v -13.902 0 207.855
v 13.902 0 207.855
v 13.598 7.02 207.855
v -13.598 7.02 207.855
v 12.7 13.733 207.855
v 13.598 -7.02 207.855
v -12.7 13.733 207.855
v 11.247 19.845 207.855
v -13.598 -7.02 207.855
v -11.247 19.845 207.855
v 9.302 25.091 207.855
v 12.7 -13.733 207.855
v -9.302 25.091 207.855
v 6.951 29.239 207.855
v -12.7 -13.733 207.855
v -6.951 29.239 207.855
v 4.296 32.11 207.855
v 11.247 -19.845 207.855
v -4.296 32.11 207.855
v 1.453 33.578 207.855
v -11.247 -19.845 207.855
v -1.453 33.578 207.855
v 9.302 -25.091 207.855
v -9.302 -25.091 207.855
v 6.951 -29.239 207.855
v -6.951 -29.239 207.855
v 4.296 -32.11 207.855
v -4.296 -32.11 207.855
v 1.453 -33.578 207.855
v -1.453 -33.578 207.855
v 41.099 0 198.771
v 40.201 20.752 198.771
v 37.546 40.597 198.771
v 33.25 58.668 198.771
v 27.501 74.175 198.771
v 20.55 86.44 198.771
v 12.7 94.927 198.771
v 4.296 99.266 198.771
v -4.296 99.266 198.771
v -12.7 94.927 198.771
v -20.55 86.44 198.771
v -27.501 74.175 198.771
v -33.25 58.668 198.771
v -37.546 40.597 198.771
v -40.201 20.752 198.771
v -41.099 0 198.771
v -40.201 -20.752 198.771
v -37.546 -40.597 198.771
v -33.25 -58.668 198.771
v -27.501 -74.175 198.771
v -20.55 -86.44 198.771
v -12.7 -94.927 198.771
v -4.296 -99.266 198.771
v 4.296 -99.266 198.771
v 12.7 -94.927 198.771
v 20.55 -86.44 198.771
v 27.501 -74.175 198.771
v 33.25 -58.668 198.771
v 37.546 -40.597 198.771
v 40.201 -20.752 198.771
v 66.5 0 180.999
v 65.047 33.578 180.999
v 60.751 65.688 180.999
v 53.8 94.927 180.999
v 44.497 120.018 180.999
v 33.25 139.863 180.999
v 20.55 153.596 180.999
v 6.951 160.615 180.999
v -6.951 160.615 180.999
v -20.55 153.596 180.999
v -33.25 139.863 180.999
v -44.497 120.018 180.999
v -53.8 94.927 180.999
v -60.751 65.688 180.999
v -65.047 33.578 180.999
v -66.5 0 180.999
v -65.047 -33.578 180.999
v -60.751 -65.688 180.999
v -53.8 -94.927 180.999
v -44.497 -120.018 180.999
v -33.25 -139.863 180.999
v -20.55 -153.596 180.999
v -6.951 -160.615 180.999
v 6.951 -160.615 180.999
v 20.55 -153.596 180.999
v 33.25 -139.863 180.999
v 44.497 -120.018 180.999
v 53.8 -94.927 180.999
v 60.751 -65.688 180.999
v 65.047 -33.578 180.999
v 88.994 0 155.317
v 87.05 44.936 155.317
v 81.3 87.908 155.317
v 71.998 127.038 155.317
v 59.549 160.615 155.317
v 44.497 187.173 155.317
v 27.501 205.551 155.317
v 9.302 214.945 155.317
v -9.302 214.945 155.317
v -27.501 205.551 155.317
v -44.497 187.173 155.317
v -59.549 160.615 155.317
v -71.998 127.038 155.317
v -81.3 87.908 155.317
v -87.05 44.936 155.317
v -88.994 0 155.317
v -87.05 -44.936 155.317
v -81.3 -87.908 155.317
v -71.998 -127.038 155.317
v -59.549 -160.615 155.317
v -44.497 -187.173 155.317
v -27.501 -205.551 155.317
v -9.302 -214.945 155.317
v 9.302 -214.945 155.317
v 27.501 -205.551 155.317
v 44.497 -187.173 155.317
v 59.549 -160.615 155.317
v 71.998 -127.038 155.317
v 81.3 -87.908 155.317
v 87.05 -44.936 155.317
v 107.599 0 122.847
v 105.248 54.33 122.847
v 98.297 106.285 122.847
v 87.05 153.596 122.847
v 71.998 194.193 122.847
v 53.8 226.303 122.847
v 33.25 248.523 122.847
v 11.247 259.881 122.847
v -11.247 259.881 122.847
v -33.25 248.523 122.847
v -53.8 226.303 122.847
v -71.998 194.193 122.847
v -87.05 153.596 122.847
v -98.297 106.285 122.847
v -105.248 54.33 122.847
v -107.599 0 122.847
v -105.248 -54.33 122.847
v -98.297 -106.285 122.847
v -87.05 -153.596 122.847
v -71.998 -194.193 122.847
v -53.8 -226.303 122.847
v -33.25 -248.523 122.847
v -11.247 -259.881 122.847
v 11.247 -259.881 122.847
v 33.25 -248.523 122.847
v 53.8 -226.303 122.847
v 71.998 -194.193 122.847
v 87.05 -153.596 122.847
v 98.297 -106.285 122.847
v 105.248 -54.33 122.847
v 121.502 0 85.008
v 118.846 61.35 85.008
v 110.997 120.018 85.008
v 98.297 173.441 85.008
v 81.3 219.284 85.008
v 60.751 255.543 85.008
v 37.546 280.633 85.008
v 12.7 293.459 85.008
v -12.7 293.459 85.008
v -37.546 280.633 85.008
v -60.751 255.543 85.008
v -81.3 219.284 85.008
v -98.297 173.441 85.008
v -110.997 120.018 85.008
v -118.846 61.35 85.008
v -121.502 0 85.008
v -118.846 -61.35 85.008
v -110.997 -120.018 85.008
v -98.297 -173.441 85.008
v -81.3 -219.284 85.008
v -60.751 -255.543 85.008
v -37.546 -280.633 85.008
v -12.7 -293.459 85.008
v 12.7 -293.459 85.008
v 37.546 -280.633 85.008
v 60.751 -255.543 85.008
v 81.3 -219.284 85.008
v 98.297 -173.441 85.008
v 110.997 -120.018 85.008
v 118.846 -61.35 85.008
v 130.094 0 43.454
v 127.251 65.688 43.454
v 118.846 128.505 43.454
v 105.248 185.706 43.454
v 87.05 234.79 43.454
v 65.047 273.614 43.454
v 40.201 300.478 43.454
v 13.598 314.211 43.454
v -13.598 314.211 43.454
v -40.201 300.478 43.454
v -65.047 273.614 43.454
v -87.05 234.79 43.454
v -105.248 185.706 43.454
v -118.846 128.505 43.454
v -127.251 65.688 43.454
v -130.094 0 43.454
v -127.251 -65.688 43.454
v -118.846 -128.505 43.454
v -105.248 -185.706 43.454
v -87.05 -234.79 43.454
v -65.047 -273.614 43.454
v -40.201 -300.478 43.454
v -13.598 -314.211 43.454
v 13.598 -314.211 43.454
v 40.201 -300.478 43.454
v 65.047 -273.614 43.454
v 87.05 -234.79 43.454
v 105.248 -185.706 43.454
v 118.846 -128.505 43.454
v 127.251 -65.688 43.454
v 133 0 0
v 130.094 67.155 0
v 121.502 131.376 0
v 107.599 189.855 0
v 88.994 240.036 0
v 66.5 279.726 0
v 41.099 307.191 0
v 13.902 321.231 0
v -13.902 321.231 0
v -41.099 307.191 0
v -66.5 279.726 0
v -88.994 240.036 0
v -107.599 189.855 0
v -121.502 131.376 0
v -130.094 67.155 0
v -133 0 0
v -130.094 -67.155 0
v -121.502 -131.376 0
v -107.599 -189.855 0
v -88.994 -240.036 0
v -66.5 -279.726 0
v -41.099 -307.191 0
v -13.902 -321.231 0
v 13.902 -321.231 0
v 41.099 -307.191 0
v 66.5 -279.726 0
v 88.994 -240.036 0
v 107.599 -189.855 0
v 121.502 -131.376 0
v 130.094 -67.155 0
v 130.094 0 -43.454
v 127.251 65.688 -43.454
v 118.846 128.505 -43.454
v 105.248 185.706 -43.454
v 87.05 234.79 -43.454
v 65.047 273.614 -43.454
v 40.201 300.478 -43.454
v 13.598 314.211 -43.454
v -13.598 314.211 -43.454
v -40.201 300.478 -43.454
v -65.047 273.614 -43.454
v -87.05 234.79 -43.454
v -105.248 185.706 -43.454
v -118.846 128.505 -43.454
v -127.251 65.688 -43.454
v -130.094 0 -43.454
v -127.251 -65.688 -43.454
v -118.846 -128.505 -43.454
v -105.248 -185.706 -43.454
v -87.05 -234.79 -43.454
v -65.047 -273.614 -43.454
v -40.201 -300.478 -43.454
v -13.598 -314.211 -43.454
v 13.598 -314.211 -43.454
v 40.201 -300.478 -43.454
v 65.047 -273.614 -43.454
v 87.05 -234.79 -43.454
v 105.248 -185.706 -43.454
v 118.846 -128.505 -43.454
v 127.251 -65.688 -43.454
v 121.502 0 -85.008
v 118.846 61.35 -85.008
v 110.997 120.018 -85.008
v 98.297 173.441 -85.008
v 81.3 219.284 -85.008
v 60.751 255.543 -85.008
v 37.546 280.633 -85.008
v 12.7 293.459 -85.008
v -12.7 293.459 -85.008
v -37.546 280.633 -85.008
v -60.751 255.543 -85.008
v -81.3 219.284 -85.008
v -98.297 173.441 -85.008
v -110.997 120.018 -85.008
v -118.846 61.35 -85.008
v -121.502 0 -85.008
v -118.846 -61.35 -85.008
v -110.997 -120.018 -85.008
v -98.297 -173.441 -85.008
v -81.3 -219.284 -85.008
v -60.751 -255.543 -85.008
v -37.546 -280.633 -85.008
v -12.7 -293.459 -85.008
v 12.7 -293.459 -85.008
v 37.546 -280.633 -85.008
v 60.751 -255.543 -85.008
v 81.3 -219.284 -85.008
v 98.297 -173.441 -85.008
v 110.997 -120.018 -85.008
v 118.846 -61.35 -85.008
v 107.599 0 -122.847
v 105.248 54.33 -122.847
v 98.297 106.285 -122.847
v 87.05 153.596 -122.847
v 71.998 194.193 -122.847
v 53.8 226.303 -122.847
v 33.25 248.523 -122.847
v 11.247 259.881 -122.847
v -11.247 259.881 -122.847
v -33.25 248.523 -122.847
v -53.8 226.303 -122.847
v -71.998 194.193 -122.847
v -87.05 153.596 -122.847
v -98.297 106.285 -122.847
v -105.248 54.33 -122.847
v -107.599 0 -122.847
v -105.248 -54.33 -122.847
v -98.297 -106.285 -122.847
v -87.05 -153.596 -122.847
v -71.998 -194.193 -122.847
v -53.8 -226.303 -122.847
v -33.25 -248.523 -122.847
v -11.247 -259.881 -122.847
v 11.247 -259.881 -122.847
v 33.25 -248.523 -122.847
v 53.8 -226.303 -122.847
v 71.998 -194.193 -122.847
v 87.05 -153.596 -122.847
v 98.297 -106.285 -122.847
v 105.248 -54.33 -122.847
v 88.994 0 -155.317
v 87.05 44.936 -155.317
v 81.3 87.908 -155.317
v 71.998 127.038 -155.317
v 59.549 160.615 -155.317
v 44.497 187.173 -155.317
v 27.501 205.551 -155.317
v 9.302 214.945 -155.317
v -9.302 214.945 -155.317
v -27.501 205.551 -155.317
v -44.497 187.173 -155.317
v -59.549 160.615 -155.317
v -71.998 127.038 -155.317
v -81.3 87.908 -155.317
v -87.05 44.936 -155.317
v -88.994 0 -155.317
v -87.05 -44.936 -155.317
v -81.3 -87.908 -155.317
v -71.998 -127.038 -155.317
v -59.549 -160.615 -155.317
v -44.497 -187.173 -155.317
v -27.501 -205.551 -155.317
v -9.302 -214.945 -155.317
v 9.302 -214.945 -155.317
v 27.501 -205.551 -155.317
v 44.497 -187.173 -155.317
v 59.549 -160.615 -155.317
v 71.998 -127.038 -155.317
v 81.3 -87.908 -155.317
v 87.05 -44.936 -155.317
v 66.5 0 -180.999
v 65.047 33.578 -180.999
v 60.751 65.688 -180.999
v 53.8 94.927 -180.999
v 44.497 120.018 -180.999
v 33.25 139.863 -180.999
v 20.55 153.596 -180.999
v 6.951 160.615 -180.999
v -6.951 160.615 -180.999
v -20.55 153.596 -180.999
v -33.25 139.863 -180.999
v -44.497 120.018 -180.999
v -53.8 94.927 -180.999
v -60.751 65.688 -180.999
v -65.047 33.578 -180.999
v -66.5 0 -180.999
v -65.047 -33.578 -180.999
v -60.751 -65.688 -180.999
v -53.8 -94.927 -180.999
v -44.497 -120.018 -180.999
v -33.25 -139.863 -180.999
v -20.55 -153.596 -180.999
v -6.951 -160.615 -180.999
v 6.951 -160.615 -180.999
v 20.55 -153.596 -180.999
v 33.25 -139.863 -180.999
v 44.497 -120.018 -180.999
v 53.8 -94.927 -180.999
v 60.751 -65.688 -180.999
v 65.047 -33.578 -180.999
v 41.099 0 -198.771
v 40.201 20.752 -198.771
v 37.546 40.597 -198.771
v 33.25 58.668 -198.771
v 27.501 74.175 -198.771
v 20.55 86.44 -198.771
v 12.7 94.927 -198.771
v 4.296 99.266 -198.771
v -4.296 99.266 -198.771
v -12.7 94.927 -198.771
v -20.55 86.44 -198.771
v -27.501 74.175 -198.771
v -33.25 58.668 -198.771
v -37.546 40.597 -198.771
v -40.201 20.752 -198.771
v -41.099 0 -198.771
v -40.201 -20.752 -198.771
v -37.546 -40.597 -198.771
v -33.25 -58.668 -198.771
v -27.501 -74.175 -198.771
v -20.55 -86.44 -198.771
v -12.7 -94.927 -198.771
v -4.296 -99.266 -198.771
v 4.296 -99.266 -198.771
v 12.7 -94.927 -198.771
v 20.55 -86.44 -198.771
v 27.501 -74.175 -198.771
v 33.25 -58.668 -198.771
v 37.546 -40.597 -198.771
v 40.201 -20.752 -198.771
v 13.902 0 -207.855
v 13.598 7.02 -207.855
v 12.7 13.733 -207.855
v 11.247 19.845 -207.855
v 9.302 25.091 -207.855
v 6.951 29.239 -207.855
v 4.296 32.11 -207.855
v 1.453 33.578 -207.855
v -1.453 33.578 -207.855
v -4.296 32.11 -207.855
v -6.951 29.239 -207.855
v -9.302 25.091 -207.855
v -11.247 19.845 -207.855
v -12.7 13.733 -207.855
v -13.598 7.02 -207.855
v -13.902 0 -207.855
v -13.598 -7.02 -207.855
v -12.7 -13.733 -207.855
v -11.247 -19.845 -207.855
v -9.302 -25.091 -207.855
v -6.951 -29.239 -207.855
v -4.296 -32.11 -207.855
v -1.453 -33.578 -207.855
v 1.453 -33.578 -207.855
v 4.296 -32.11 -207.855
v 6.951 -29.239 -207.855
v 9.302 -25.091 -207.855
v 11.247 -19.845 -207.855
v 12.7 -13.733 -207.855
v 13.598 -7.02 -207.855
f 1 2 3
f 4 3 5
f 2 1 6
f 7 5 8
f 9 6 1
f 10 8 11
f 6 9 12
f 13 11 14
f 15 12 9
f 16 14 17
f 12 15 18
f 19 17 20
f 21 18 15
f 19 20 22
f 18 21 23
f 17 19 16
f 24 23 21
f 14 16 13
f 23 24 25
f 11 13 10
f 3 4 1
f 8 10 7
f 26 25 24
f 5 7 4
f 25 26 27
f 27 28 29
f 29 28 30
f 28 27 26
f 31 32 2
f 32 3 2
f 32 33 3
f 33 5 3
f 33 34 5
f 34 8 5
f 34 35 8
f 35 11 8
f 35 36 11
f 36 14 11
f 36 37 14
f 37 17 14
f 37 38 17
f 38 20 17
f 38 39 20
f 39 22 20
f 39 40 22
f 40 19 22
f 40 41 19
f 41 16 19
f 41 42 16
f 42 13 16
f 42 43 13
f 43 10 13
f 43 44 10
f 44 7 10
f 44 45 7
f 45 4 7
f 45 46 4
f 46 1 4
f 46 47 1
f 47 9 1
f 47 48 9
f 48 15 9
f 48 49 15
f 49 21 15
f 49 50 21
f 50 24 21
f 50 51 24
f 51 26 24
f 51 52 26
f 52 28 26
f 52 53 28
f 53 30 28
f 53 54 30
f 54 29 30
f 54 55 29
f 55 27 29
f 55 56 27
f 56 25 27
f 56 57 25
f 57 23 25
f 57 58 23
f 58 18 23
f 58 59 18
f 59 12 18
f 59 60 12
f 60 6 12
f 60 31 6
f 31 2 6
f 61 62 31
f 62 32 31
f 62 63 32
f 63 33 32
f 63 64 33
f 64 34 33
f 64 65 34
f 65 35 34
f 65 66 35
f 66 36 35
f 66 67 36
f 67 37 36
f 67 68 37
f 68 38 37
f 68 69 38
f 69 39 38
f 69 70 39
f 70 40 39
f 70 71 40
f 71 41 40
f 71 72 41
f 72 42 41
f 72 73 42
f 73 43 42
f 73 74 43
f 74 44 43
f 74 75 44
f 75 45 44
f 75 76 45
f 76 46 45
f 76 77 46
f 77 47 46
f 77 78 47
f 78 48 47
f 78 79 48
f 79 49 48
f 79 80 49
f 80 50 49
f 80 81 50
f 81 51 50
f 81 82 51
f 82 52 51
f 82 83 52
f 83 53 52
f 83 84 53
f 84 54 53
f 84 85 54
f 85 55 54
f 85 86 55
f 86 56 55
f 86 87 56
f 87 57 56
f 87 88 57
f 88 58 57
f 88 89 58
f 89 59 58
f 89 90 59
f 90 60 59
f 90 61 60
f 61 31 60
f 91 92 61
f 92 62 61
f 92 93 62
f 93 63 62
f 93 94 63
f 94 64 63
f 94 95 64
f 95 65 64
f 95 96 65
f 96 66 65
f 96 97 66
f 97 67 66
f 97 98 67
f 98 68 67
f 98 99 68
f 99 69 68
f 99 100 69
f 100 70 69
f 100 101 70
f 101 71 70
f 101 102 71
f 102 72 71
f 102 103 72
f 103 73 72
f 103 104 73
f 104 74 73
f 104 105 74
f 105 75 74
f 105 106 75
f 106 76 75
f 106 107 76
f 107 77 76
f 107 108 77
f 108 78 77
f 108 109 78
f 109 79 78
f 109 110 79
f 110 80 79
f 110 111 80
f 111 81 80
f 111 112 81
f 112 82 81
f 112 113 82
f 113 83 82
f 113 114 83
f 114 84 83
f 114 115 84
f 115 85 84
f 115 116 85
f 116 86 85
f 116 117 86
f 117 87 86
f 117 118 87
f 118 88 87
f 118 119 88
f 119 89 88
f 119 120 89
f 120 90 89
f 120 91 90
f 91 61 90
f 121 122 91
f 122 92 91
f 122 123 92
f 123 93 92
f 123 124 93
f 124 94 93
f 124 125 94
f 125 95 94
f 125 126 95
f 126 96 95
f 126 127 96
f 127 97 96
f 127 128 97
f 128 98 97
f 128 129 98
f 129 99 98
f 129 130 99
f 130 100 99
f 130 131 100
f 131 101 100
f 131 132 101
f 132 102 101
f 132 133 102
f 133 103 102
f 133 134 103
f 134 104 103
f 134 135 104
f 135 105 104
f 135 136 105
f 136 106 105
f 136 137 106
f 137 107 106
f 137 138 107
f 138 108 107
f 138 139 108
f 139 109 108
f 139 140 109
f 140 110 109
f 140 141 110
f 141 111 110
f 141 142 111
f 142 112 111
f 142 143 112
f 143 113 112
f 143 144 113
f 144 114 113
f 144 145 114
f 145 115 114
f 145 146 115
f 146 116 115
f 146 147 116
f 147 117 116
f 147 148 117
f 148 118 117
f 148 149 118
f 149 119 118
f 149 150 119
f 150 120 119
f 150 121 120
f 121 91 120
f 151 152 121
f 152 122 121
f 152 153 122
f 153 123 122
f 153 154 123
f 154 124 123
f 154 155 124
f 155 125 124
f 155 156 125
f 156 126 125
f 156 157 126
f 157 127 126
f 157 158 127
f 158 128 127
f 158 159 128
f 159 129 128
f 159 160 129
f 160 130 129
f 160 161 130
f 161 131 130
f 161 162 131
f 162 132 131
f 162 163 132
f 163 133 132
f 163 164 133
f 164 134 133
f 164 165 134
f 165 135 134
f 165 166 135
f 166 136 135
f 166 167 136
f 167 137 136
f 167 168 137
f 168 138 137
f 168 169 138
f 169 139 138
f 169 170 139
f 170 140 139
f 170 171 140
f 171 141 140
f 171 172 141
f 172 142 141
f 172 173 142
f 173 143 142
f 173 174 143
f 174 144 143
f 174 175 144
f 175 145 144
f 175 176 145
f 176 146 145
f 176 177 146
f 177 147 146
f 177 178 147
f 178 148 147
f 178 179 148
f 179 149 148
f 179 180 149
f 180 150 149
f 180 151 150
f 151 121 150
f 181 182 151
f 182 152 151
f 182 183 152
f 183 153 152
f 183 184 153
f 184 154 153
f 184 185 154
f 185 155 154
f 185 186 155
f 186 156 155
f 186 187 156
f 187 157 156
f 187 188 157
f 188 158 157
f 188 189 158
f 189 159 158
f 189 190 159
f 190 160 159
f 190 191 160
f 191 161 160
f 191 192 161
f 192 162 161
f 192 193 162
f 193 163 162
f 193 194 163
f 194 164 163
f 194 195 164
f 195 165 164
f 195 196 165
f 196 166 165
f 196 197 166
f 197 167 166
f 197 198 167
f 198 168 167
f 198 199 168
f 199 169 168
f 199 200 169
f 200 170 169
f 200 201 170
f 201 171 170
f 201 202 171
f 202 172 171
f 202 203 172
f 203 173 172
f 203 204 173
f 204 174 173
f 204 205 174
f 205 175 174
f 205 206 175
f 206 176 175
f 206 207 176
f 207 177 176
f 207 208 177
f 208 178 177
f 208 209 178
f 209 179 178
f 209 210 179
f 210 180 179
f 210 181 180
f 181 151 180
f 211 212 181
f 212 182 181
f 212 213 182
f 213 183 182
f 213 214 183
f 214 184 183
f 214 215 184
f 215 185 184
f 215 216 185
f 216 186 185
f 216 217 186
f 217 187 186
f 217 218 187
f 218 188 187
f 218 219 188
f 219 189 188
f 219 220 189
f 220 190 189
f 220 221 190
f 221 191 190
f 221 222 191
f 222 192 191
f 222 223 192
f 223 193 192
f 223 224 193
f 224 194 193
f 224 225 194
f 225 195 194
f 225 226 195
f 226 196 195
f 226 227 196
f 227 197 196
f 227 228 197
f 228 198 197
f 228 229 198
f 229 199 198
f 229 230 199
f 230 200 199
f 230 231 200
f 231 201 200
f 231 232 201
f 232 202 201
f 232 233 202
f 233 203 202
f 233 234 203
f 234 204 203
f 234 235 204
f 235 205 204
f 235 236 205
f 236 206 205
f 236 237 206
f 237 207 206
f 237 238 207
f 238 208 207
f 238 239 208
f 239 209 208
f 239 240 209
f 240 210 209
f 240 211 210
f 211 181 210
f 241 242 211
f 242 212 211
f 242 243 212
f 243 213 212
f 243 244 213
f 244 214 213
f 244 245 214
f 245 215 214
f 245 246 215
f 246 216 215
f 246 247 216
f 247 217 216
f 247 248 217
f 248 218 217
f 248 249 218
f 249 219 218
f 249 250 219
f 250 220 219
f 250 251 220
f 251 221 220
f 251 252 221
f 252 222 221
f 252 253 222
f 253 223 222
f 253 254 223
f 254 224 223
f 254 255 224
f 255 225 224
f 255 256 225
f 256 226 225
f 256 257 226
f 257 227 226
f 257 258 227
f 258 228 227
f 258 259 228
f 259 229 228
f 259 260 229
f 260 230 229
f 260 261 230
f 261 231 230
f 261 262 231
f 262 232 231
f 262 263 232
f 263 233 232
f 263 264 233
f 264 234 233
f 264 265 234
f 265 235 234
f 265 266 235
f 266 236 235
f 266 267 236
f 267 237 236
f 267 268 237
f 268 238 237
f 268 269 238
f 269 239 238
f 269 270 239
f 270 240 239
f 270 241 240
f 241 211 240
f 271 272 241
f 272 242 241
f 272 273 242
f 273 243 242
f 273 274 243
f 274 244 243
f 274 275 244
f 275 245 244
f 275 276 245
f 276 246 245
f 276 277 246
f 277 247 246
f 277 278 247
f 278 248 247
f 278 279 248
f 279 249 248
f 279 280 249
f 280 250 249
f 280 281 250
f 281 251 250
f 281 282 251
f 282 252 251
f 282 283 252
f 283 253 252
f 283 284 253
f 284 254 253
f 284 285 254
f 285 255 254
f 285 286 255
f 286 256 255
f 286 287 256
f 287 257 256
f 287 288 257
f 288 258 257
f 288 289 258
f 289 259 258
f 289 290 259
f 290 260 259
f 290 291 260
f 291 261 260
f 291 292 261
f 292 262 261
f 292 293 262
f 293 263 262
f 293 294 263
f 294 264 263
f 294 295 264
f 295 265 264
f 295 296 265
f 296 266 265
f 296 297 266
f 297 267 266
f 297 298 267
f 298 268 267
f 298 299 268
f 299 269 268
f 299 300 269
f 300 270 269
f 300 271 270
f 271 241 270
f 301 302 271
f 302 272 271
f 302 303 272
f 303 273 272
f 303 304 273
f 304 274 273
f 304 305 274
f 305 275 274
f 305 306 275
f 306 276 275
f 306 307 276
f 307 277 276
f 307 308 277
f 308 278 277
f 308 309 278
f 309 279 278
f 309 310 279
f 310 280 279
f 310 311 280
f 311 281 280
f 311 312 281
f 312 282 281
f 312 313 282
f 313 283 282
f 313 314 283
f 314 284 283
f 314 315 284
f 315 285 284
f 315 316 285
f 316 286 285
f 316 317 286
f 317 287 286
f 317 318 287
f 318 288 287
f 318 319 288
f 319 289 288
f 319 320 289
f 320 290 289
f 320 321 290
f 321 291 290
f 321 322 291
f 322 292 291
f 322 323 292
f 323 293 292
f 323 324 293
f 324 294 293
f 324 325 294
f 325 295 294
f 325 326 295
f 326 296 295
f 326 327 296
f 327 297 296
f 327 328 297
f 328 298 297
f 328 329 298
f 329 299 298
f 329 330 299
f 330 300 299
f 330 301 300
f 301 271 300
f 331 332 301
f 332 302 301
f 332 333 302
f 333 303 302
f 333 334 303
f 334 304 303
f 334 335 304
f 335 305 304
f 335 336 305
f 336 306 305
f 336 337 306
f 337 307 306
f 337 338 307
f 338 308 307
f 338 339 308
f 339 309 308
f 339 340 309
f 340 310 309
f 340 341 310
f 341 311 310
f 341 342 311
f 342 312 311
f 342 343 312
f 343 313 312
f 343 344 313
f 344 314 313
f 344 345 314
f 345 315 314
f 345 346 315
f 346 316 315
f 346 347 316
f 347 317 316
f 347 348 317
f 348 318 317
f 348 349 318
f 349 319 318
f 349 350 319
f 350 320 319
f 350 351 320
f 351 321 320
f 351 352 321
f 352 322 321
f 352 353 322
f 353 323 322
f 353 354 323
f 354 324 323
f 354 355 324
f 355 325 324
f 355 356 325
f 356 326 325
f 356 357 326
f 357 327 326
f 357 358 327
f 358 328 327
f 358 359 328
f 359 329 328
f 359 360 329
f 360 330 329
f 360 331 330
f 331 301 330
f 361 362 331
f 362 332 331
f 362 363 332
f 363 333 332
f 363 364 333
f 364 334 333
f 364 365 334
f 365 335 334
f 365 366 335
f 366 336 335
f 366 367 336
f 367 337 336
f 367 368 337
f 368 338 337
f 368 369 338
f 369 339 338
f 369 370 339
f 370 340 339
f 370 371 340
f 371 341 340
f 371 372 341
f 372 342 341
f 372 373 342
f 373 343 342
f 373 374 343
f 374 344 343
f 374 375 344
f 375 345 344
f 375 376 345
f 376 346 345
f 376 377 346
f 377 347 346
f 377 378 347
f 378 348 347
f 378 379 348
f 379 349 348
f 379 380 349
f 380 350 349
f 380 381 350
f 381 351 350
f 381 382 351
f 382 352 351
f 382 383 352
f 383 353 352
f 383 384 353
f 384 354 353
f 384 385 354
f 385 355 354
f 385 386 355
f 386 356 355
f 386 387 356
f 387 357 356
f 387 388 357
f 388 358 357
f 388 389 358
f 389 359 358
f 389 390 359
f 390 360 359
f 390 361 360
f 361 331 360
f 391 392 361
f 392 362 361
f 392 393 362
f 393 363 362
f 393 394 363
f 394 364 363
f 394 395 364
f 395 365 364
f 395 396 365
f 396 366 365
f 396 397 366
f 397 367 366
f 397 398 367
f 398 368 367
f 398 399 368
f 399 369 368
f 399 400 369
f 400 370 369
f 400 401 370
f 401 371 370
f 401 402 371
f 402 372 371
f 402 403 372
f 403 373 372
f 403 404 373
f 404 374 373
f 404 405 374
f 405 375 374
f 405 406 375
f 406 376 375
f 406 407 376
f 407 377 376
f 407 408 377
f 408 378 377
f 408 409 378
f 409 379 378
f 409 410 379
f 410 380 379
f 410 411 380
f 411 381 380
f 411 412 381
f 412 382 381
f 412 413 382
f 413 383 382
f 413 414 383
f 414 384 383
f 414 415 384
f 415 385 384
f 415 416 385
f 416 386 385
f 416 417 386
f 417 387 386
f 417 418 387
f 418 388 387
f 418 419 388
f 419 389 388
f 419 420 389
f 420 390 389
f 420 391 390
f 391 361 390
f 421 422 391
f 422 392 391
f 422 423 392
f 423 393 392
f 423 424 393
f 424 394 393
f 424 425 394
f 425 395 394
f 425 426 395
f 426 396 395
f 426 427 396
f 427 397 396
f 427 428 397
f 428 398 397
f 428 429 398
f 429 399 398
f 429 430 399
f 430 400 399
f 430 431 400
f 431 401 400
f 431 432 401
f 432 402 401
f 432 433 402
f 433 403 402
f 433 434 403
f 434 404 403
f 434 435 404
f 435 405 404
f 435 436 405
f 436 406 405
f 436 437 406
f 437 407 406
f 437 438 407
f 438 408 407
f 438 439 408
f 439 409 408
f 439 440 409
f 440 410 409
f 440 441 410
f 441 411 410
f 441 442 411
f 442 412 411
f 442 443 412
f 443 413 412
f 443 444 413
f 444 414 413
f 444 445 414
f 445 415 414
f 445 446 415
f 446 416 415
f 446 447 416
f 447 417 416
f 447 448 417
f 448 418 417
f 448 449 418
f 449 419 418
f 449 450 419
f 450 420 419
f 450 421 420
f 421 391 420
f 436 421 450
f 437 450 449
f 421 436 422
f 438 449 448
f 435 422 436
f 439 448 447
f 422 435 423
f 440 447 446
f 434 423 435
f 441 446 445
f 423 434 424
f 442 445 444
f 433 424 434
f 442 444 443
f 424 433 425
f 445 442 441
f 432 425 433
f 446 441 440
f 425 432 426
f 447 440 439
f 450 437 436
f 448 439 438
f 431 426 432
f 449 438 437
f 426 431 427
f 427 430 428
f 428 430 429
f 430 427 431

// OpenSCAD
// Generated by SolidPython 1.0.1 on 2020-07-29 00:46:48


scale(v = [7, 17, 11]) {
	sphere(r = 19);
}
/***********************************************
*********      SolidPython code:      **********
************************************************
 
# import packages: SolidPython
from solid import *
from solid.utils import *
from itertools import chain, combinations, permutations


class Resize:

    def __init__(self, scad_file):
        self.scad_file = scad_file
        #self.scad_file = import_scad(scad_file)
        # cone/cylinder param:
        self.r1 = 0
        self.r2 = 0
        self.h = 0
        # rectangular prism param:
        self.w = 0
        self.l = 0
        # ellipse param:
        self.r = 0

    # import OpenScad code (file name corresponds to shape)


    # classify shape + parameters
    def assign(self, param1, param2, param3):
        if self.scad_file == 'cone.scad':
            self.r1 = param1
            self.r2 = param2
            self.h = param3
        elif self.scad_file == 'cylinder.scad':
            self.r1 = param1
            self.r2 = param2
            self.h = param3
        elif self.scad_file == 'rectangularPrism.scad':
            self.h = param1
            self.l = param2
            self.w = param3
        else:
            self.r = param1
            self.h = param2

    # resize parameters
    def iterate(self):
        x = range(3, 20, 2)
        i = 1
        if self.scad_file == 'cone.scad':
            tempList = list(permutations(x, 2))
            for temp in tempList:
                param1 = temp[0]
                param2 = temp[1]
                filepath = 'produced_scad_files/' + 'cone' + str(param1) + '_' + str(param2) + '_' + '.scad'
                scad_render_to_file(cylinder(h=param1, r1=param2, r2=0), filepath)

        elif self.scad_file == 'cylinder.scad':
            tempList = list(permutations(x, 3))
            for temp in tempList:
                param1 = temp[0]
                param2 = temp[1]
                filepath = 'produced_scad_files/' + 'cylinder' + str(param1) + '_' + str(param2) + '_' + '.scad'
                scad_render_to_file(cylinder(h=param1, r1=param2, r2=param2), filepath)

        elif self.scad_file == 'rectangularPrism.scad':
            tempList = list(permutations(x, 3))
            for temp in tempList:
                param1 = temp[0]
                param2 = temp[1]
                param3 = temp[2]
                filepath = 'produced_scad_files/' + 'rectangularPrism' + str(param1) + '_' + str(param2) + '_' + str(
                    param3) + '.scad'
                scad_render_to_file(cube(size=(param1, param2, param3)), filepath)

        elif self.scad_file == 'ellipse.scad':
            tempList = list(permutations(x, 4))
            for temp in tempList:
                param1 = temp[0]
                param2 = temp[1]
                param3 = temp[2]
                param4 = temp[3]
                filepath = 'produced_scad_files/' + 'ellipse' + str(param1) + '_' + str(param2) + '_' + str(param3) + '_' + str(param4) + '.scad'
                scad_render_to_file(scale([param1, param2, param3])(sphere(r=param4)), filepath)

    def render_to_scadfile(self):
        scad_render_to_file(scad, 'example.scad') 
 
************************************************/
